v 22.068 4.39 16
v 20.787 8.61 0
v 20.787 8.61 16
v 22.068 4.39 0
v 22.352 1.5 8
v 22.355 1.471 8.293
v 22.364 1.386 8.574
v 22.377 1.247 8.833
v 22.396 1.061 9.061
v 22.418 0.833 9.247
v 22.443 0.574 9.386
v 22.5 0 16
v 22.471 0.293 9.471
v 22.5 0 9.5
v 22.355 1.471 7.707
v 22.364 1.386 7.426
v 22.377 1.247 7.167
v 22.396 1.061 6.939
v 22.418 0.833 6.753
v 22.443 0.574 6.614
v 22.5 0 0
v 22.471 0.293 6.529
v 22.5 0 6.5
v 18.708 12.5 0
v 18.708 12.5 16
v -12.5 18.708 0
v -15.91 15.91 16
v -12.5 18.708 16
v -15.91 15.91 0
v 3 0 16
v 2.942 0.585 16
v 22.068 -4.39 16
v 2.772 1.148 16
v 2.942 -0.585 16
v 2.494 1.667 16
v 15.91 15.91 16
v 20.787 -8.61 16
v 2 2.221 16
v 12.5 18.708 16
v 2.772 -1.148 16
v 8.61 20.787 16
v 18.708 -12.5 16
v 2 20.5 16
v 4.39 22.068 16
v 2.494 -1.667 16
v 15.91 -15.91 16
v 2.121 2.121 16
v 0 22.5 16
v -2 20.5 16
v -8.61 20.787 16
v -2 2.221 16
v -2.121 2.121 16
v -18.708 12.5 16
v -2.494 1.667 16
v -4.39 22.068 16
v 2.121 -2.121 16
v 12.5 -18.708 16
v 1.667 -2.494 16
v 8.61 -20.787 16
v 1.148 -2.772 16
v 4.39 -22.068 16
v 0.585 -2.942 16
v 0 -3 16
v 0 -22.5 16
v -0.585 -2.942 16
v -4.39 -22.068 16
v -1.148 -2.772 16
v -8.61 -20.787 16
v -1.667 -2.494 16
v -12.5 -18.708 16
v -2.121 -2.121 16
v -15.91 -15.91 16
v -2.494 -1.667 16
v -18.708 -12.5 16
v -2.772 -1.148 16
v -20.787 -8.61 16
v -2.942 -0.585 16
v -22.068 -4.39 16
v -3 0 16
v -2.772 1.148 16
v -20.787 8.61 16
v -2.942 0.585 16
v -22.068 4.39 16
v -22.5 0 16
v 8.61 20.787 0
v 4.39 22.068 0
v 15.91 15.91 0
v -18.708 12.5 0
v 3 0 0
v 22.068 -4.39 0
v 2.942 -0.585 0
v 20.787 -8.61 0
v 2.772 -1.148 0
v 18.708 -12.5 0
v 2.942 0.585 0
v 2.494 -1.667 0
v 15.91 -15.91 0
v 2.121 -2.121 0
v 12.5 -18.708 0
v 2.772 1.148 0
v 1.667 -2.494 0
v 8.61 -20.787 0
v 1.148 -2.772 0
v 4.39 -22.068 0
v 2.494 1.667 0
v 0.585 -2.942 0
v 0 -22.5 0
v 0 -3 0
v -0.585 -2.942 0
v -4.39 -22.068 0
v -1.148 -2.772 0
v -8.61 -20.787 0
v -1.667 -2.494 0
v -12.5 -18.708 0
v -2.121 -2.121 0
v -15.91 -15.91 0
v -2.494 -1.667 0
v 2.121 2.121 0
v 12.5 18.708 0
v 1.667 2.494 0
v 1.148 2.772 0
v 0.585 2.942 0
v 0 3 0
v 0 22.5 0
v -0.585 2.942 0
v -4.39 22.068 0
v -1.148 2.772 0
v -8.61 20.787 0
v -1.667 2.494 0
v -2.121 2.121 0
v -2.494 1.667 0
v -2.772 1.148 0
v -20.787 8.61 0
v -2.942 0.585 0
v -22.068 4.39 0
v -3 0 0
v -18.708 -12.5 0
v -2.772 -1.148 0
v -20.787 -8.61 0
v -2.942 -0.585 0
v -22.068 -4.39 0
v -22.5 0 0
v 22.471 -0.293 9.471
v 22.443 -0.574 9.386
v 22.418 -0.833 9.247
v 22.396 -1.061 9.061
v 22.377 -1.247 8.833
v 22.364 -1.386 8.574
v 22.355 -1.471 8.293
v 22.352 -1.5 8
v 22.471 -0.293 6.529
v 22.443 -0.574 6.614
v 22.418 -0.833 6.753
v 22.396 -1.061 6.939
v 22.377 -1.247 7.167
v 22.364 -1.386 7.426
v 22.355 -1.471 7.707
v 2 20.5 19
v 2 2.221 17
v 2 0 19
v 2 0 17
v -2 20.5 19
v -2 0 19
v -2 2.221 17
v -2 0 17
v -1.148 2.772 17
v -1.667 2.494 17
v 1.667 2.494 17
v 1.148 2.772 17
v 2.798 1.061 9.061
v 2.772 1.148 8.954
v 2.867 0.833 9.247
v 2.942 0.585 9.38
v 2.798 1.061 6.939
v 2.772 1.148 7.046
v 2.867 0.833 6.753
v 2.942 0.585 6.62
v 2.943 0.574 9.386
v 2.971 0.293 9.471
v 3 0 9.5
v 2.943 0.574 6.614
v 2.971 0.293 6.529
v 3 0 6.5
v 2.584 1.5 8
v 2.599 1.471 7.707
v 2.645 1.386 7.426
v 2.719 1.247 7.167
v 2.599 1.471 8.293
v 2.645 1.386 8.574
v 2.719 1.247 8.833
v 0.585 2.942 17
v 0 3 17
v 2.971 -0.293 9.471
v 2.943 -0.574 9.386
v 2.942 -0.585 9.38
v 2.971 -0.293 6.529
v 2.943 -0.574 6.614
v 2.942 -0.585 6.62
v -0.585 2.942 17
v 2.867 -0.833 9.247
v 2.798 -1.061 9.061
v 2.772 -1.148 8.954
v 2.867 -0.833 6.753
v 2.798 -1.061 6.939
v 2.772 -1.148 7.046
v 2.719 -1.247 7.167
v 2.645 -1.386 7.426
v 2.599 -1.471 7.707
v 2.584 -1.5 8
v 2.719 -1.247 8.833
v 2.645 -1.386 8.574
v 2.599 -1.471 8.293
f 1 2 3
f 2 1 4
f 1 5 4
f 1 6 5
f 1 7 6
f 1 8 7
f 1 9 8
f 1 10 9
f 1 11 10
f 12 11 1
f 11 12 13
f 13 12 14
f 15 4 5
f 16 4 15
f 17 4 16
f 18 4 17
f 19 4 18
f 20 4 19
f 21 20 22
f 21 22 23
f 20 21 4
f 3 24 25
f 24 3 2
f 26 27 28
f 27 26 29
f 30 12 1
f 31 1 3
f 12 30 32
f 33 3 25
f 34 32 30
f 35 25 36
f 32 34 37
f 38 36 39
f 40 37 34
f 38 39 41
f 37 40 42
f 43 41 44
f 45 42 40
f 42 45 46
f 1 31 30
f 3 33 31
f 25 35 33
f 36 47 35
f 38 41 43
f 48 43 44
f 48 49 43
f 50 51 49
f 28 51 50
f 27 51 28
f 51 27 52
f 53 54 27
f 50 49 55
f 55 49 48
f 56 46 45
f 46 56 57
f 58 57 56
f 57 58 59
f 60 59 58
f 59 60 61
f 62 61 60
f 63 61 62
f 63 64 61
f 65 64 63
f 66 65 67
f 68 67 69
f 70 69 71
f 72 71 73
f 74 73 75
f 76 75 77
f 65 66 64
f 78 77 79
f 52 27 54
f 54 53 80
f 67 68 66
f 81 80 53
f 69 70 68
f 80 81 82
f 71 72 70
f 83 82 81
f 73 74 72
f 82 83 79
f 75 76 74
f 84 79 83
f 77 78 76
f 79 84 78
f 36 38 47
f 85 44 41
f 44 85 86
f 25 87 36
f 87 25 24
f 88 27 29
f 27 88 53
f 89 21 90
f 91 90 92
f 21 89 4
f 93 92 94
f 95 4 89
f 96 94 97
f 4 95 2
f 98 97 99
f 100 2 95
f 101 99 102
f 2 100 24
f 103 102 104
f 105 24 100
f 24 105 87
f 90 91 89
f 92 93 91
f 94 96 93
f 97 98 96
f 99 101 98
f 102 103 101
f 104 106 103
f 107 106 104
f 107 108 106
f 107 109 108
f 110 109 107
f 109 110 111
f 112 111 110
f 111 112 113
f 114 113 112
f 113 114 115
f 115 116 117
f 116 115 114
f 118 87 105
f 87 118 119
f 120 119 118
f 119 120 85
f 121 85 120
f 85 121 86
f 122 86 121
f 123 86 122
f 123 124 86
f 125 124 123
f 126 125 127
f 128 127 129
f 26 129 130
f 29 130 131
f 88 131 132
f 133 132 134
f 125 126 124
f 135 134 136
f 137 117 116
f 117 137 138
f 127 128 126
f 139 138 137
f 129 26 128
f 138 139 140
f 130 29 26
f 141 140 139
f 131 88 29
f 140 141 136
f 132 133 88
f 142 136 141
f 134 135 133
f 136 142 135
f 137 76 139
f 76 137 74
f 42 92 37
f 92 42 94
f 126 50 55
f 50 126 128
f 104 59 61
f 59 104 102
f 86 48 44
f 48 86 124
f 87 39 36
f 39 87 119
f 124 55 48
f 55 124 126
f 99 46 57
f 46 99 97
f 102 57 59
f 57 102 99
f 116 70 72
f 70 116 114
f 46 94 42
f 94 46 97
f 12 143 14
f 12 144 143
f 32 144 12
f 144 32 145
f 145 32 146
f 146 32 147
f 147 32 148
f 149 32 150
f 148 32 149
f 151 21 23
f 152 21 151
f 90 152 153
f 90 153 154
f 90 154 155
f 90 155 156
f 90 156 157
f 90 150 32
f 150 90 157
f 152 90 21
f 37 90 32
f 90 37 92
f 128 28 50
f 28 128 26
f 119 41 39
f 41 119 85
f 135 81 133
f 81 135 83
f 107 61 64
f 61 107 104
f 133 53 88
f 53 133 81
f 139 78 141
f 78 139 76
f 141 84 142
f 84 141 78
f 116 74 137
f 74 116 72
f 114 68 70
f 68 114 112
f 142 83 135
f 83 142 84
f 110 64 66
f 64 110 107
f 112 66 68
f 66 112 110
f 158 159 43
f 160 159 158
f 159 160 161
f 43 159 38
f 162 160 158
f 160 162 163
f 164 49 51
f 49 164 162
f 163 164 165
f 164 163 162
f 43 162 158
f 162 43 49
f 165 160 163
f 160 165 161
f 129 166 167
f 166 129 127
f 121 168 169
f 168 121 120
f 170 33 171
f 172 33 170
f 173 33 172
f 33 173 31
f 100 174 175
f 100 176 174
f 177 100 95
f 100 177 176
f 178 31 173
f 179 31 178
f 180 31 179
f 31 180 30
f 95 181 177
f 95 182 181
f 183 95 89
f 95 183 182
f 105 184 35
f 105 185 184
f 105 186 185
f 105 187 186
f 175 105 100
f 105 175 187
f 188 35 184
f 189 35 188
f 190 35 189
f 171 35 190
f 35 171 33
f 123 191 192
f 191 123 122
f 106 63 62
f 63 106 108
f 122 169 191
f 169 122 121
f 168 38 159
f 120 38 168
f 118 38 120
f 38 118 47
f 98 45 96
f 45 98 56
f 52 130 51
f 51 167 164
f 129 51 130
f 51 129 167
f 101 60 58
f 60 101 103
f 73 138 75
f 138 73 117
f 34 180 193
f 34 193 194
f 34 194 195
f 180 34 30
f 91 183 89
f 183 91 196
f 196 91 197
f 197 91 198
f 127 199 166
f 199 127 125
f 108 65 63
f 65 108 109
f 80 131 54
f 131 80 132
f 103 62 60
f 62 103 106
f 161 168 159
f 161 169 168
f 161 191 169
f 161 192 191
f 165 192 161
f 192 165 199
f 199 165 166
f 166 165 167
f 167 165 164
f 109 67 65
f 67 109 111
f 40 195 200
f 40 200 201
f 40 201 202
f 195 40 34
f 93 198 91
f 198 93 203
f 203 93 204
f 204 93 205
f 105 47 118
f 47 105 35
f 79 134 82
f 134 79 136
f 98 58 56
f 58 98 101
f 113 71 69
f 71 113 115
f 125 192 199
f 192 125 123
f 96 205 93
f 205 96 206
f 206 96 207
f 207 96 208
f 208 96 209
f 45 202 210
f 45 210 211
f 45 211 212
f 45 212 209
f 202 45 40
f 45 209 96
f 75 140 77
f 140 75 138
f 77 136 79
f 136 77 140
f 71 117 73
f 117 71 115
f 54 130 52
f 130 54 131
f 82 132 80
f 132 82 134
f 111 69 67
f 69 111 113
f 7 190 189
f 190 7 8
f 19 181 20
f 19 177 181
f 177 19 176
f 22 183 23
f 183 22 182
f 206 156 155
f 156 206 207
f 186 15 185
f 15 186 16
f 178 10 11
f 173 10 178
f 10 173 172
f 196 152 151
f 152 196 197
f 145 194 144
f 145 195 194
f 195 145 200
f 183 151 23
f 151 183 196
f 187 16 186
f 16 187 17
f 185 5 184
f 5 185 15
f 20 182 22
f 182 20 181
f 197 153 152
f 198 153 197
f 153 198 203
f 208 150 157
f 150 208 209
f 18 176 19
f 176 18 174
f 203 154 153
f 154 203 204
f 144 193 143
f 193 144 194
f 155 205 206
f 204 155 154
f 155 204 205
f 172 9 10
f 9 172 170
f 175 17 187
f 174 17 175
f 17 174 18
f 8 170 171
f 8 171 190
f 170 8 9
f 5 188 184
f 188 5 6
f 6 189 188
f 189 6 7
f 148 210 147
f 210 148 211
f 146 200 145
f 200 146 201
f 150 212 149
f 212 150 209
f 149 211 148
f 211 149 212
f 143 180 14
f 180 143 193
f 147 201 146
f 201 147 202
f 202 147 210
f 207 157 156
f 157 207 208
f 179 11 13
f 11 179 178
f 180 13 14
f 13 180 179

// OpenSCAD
$fn = 32;

// ----------------------------------------------------------------------
// Control knob: pointer knob
// ----------------------------------------------------------------------

// --- parameters (mm) ---
rib_w = 4;                // pointer rib width
rib_h = 4;                // pointer rib height
knob_d = 45;              // knob body diameter
knob_h = 16;              // knob body height
bore_d = 6;               // shaft bore diameter
set_d = 3;                // set screw bore diameter

rib_poke = rib_h - 1;  // rib height above the top
total_h = knob_h + rib_h - 1;  // overall height

difference() {
  union() {
    cylinder(h = knob_h, d = knob_d);
    translate([-rib_w / 2, 0, knob_h - 1])
      cube([rib_w, knob_d / 2 - 2, rib_h]);
  }
  translate([0, 0, -1]) cylinder(h = knob_h + 2, d = bore_d);
  translate([-1, 0, knob_h / 2]) rotate([0, 90, 0])
    cylinder(h = knob_d / 2 + bore_d / 2 + 2, d = set_d);}
